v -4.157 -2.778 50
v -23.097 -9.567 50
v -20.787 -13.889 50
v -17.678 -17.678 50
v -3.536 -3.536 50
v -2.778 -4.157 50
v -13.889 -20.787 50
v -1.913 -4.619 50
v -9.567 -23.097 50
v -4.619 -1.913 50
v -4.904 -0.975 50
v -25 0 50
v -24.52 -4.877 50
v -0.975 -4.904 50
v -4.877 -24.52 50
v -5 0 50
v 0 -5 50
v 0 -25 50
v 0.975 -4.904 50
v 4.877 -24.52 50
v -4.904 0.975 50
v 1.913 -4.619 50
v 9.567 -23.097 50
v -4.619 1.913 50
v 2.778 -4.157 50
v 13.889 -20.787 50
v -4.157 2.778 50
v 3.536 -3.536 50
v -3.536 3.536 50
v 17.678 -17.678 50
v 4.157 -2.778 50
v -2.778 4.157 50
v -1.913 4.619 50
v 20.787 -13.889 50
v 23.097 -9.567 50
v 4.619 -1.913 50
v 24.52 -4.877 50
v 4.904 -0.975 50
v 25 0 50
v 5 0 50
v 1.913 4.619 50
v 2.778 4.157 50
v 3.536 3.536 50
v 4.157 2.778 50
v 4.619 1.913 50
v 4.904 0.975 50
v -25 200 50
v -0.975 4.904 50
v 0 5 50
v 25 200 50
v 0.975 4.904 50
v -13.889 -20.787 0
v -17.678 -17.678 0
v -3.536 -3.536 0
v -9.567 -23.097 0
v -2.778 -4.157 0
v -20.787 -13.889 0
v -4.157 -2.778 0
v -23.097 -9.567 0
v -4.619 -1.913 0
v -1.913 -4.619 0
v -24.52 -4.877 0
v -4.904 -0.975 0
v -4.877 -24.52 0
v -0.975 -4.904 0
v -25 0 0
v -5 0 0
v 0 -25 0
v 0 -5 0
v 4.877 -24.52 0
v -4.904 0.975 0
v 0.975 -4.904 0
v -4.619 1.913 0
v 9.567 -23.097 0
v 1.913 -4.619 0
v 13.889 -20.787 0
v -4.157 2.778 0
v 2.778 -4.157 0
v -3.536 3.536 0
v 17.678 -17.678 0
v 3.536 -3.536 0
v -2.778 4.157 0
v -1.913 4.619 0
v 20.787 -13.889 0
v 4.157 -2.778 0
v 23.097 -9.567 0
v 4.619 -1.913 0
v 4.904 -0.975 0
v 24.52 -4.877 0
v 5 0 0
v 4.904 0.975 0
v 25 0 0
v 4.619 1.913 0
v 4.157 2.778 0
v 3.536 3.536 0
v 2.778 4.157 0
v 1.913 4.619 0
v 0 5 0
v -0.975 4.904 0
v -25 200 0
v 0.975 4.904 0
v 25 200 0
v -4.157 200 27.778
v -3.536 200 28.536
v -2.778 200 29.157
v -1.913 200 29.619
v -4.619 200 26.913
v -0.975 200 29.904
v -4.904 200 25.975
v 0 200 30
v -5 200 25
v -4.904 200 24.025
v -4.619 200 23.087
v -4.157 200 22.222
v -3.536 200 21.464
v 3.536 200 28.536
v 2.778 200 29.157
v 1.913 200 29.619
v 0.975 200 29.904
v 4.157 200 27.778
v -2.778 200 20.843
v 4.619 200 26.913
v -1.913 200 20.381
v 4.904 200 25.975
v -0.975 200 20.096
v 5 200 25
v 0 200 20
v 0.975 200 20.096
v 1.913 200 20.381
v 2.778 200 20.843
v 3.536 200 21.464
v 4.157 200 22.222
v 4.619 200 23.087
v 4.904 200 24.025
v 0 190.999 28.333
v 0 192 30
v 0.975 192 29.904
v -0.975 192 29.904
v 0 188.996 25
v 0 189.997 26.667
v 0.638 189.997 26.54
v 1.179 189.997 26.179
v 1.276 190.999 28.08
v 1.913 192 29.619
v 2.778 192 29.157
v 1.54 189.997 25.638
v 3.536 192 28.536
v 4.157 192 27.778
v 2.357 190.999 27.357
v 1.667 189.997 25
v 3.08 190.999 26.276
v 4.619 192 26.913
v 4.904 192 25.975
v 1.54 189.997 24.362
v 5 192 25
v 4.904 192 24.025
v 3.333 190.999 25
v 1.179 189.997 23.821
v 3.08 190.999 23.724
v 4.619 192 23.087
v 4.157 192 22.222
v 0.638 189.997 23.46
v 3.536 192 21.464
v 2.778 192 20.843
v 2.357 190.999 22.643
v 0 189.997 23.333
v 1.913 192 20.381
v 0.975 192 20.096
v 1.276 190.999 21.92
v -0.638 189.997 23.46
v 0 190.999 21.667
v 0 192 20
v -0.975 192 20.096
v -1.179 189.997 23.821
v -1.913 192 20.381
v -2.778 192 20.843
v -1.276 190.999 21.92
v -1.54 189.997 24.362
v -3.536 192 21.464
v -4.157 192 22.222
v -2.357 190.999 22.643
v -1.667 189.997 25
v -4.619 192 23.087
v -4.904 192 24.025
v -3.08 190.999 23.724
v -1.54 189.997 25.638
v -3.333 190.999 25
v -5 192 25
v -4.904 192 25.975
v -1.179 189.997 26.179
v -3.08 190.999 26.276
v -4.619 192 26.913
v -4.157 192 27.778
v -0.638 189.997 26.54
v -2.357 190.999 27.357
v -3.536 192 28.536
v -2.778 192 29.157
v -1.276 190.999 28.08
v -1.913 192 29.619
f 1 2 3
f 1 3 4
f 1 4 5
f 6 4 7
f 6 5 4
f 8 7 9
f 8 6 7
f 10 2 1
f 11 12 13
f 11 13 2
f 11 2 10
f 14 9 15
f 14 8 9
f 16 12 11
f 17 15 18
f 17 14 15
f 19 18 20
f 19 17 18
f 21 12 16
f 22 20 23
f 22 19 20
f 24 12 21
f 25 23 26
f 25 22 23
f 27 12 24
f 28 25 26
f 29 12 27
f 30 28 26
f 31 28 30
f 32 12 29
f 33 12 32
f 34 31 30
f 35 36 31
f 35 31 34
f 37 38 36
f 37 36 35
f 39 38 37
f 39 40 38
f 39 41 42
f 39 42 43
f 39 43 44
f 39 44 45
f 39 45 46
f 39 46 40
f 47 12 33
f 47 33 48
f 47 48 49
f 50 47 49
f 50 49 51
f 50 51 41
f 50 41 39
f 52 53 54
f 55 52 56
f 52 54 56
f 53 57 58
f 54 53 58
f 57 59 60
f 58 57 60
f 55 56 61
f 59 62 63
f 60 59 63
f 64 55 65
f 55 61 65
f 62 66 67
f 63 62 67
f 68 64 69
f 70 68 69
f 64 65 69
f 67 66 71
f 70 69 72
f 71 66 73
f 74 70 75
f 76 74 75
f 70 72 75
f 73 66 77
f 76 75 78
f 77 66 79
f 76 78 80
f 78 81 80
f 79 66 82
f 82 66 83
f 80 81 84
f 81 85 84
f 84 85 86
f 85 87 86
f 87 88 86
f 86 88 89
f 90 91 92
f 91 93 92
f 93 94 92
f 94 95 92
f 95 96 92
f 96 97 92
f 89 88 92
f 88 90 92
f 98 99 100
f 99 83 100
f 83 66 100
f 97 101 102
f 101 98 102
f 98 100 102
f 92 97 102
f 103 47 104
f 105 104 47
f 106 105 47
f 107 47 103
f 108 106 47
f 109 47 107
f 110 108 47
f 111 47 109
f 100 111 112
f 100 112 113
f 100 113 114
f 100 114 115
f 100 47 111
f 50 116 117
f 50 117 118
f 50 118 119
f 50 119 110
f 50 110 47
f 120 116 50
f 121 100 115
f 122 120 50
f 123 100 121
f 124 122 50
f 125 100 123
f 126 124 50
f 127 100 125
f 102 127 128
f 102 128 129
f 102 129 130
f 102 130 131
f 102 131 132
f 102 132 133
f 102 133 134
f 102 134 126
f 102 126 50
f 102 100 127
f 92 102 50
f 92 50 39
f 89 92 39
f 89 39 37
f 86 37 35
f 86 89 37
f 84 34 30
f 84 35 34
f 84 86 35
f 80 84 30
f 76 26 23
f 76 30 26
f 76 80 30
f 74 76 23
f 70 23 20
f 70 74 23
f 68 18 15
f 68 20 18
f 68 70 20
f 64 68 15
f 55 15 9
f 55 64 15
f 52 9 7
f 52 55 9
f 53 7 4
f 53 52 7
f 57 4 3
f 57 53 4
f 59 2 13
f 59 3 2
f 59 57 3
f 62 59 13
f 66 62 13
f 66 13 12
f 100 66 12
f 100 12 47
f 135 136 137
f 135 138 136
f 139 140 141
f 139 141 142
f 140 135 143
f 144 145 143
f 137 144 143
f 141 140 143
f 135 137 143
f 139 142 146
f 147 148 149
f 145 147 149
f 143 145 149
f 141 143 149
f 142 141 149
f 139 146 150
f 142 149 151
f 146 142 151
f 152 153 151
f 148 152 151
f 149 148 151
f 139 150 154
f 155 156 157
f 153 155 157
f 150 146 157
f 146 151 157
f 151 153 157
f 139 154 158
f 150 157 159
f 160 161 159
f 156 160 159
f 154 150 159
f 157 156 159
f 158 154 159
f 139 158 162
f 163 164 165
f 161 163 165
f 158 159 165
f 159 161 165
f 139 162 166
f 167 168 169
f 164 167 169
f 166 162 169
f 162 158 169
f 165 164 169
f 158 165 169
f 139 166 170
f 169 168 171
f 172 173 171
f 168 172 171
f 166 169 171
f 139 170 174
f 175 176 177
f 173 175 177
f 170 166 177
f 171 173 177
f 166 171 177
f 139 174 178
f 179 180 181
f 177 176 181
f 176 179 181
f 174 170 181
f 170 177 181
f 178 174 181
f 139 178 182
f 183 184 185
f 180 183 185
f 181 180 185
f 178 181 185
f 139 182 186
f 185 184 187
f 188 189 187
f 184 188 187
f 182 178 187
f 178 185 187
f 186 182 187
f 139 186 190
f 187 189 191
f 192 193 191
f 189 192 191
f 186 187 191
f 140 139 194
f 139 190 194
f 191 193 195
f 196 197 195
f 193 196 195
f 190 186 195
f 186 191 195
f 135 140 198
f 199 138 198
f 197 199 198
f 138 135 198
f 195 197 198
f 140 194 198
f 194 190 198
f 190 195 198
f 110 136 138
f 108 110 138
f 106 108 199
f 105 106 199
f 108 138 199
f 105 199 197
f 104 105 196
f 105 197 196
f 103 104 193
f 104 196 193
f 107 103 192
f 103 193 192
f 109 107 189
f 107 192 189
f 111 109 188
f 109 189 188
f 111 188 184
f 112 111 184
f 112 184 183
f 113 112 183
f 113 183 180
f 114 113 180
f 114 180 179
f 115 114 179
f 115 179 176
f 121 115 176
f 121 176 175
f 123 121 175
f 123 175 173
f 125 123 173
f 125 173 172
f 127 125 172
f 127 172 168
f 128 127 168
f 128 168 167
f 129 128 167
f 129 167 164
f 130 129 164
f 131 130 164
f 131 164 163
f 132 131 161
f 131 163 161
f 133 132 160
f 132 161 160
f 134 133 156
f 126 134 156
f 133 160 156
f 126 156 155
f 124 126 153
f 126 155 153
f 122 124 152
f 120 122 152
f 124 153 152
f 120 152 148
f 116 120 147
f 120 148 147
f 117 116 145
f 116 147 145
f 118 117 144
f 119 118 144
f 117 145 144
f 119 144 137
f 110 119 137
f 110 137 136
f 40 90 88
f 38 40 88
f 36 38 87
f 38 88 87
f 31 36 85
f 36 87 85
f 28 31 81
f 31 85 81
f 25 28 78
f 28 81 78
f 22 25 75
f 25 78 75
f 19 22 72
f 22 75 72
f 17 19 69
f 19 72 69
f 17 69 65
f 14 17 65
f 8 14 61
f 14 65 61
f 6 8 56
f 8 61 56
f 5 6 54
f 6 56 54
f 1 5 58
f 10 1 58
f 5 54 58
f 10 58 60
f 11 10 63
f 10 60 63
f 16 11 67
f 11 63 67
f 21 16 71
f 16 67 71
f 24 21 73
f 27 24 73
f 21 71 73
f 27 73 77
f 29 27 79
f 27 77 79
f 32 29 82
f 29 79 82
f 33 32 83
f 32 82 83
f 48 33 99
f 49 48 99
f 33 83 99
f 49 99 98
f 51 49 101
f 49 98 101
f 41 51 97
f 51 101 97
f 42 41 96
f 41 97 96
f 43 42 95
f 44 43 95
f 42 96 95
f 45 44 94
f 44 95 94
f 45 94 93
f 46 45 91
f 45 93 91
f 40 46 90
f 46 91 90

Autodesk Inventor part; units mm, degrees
ref_plane "YZ Plane" through (0, 0, 0) normal (1, 0, 0) x (0, 1, 0)
ref_plane "XZ Plane" through (0, 0, 0) normal (0, 1, 0) x (-1, 0, 0)
ref_plane "XY Plane" through (0, 0, 0) normal (0, 0, 1) x (1, 0, 0)
sketch "Sketch1" plane through (0, 0, 0) normal (0, 0, 1) x (1, 0, 0)
  circle A0 centre (0, 0) radius 5
  circle A1 centre (0, 0) radius 25
  line L0 (25, 0) -> (-25, 0)
  line L1 (-25, 0) -> (-25, 200)
  line L2 (-25, 200) -> (25, 200)
  line L3 (25, 200) -> (25, 0)
  dimension "d1" = 50
  dimension "d0" = 10
  dimension "d2" = 200
extrude "Extrusion1" add sketch "Sketch1" along normal blind 50 contours L0 A1 A0 | A0 L0 A1 | A1 L1 L2 L3
sketch "Sketch2" plane through (-25, 200, 0) normal (0, 1, 0) x (1, 0, 0)
  line L0 (50, 0) -> (0, 0) projected
  line L1 (0, 0) -> (0, -50) projected
  point P0 (25, 0)
  point P1 (25, -25)
  dimension "d5" = 25
  dimension "d6" = 25
hole "Hole1" at (0, 200, 25) direction (0, -1, 0) diameter 10 depth 8 tip angle 118
properties part number "link5"
